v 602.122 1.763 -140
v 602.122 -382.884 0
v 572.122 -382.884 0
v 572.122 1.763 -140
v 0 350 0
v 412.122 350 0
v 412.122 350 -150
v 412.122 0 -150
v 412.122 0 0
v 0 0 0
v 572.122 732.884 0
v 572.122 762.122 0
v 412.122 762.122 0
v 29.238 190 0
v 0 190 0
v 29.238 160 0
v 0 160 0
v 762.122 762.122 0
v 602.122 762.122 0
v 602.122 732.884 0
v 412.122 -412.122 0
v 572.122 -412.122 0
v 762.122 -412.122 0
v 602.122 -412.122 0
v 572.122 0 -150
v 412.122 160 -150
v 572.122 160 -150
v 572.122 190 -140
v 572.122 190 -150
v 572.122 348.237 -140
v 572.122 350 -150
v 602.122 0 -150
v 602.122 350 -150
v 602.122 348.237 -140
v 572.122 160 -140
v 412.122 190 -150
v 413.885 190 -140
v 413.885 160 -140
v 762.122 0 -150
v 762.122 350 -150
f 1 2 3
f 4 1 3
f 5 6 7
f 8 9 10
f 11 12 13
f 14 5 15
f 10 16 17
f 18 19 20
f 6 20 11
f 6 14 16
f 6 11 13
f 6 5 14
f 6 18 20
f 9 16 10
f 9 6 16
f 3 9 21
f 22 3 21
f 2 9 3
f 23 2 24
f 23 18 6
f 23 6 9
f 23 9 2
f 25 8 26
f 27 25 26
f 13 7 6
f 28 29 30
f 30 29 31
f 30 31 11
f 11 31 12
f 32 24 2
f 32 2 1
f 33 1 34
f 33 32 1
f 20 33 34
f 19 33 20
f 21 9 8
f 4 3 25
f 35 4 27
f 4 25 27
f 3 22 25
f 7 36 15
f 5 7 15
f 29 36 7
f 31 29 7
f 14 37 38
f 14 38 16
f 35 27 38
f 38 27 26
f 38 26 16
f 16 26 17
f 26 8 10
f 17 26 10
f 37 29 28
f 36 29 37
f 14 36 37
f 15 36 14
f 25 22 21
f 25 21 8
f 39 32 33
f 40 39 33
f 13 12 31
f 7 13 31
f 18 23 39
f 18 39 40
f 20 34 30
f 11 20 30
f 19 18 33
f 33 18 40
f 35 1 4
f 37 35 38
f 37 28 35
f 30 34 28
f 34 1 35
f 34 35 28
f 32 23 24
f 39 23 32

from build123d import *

# Parameters (mm, degrees)
BOSS_EXTRUDE1_DEPTH = 350
SKETCH2_W           = 150
SKETCH2_H           = 350
BOSS_EXTRUDE2_DEPTH = 350
BOSS_EXTRUDE3_DEPTH = 350
BOSS_EXTRUDE4_DEPTH = 350
SKETCH6_W           = 438.570660024
SKETCH6_H           = 30
CUT_EXTRUDE1_DEPTH  = 10
CUT_EXTRUDE2_DEPTH  = 10
SKETCH8_W           = 30
SKETCH8_H           = 438.570660025
CUT_EXTRUDE3_DEPTH  = 10
SKETCH9_W           = 30
SKETCH9_H           = 438.570660025
CUT_EXTRUDE4_DEPTH  = 10


with BuildPart() as part:
    # Sketch1 → Boss-Extrude1 (new body)
    with BuildSketch(Plane(origin=(0, 0, 0), x_dir=(1, 0, 0), z_dir=(0, 1, 0))):
        Polygon((0, 0), (412.121612918, 0), (412.121612918, 150), align=None)
    extrude(amount=BOSS_EXTRUDE1_DEPTH)

    # Sketch2 → Boss-Extrude2 (add)
    with BuildSketch(Plane(origin=(412.121612918, 0, 0), x_dir=(0, 0, -1), z_dir=(1, 0, 0))):
        with Locations((75, 175)):
            Rectangle(SKETCH2_W, SKETCH2_H)
    extrude(amount=BOSS_EXTRUDE2_DEPTH)

    # Sketch4 → Boss-Extrude3 (add)
    with BuildSketch(Plane(origin=(762.121612918, 0, 0), x_dir=(0, 0, -1), z_dir=(1, 0, 0))):
        Polygon((0, 762.121612918), (150, 350), (0, 350), align=None)
    extrude(amount=-BOSS_EXTRUDE3_DEPTH)

    # Sketch5 → Boss-Extrude4 (add)
    with BuildSketch(Plane(origin=(762.121612918, 0, 0), x_dir=(0, 0, -1), z_dir=(1, 0, 0))):
        Polygon((0, 0), (0, -412.121612918), (150, 0), align=None)
    extrude(amount=-BOSS_EXTRUDE4_DEPTH)

    # Sketch6 → Cut-Extrude1 (cut)
    with BuildSketch(Plane(origin=(0, 0, 0), x_dir=(-0.9396926207859104, 0, 0.34202014332566316), z_dir=(-0.34202014332566316, 0, -0.9396926207859104))):
        with Locations((-219.285330012, 175)):
            Rectangle(SKETCH6_W, SKETCH6_H)
    extrude(amount=-CUT_EXTRUDE1_DEPTH, mode=Mode.SUBTRACT)

    # Sketch7 → Cut-Extrude2 (cut)
    with BuildSketch(Plane(origin=(0, 0, -150), x_dir=(-1, 0, 0), z_dir=(0, 0, -1))):
        Polygon((-412.121612918, 190), (-572.121612918, 190), (-572.121612918, 350), (-602.121612918, 350), (-602.121612918, 190), (-602.121612918, 164.900861359), (-602.121612918, 160), (-602.121612918, 0), (-572.121612918, 0), (-572.121612918, 160), (-412.121612918, 160), align=None)
    extrude(amount=-CUT_EXTRUDE2_DEPTH, mode=Mode.SUBTRACT)

    # Sketch8 → Cut-Extrude3 (cut)
    with BuildSketch(Plane(origin=(0, -48.209070726, -132.453333234), x_dir=(-1, 0, 0), z_dir=(0, -0.34202014332566283, -0.9396926207859106))):
        with Locations((-587.121612918, -167.982308514)):
            Rectangle(SKETCH8_W, SKETCH8_H)
    extrude(amount=-CUT_EXTRUDE3_DEPTH, mode=Mode.SUBTRACT)

    # Sketch9 → Cut-Extrude4 (cut)
    with BuildSketch(Plane(origin=(0, 89.151293181, -244.941164929), x_dir=(-1, 0, 0), z_dir=(0, 0.342020143325663, -0.9396926207859105))):
        with Locations((-587.121612918, 496.874725788)):
            Rectangle(SKETCH9_W, SKETCH9_H)
    extrude(amount=-CUT_EXTRUDE4_DEPTH, mode=Mode.SUBTRACT)


solid = part.part
